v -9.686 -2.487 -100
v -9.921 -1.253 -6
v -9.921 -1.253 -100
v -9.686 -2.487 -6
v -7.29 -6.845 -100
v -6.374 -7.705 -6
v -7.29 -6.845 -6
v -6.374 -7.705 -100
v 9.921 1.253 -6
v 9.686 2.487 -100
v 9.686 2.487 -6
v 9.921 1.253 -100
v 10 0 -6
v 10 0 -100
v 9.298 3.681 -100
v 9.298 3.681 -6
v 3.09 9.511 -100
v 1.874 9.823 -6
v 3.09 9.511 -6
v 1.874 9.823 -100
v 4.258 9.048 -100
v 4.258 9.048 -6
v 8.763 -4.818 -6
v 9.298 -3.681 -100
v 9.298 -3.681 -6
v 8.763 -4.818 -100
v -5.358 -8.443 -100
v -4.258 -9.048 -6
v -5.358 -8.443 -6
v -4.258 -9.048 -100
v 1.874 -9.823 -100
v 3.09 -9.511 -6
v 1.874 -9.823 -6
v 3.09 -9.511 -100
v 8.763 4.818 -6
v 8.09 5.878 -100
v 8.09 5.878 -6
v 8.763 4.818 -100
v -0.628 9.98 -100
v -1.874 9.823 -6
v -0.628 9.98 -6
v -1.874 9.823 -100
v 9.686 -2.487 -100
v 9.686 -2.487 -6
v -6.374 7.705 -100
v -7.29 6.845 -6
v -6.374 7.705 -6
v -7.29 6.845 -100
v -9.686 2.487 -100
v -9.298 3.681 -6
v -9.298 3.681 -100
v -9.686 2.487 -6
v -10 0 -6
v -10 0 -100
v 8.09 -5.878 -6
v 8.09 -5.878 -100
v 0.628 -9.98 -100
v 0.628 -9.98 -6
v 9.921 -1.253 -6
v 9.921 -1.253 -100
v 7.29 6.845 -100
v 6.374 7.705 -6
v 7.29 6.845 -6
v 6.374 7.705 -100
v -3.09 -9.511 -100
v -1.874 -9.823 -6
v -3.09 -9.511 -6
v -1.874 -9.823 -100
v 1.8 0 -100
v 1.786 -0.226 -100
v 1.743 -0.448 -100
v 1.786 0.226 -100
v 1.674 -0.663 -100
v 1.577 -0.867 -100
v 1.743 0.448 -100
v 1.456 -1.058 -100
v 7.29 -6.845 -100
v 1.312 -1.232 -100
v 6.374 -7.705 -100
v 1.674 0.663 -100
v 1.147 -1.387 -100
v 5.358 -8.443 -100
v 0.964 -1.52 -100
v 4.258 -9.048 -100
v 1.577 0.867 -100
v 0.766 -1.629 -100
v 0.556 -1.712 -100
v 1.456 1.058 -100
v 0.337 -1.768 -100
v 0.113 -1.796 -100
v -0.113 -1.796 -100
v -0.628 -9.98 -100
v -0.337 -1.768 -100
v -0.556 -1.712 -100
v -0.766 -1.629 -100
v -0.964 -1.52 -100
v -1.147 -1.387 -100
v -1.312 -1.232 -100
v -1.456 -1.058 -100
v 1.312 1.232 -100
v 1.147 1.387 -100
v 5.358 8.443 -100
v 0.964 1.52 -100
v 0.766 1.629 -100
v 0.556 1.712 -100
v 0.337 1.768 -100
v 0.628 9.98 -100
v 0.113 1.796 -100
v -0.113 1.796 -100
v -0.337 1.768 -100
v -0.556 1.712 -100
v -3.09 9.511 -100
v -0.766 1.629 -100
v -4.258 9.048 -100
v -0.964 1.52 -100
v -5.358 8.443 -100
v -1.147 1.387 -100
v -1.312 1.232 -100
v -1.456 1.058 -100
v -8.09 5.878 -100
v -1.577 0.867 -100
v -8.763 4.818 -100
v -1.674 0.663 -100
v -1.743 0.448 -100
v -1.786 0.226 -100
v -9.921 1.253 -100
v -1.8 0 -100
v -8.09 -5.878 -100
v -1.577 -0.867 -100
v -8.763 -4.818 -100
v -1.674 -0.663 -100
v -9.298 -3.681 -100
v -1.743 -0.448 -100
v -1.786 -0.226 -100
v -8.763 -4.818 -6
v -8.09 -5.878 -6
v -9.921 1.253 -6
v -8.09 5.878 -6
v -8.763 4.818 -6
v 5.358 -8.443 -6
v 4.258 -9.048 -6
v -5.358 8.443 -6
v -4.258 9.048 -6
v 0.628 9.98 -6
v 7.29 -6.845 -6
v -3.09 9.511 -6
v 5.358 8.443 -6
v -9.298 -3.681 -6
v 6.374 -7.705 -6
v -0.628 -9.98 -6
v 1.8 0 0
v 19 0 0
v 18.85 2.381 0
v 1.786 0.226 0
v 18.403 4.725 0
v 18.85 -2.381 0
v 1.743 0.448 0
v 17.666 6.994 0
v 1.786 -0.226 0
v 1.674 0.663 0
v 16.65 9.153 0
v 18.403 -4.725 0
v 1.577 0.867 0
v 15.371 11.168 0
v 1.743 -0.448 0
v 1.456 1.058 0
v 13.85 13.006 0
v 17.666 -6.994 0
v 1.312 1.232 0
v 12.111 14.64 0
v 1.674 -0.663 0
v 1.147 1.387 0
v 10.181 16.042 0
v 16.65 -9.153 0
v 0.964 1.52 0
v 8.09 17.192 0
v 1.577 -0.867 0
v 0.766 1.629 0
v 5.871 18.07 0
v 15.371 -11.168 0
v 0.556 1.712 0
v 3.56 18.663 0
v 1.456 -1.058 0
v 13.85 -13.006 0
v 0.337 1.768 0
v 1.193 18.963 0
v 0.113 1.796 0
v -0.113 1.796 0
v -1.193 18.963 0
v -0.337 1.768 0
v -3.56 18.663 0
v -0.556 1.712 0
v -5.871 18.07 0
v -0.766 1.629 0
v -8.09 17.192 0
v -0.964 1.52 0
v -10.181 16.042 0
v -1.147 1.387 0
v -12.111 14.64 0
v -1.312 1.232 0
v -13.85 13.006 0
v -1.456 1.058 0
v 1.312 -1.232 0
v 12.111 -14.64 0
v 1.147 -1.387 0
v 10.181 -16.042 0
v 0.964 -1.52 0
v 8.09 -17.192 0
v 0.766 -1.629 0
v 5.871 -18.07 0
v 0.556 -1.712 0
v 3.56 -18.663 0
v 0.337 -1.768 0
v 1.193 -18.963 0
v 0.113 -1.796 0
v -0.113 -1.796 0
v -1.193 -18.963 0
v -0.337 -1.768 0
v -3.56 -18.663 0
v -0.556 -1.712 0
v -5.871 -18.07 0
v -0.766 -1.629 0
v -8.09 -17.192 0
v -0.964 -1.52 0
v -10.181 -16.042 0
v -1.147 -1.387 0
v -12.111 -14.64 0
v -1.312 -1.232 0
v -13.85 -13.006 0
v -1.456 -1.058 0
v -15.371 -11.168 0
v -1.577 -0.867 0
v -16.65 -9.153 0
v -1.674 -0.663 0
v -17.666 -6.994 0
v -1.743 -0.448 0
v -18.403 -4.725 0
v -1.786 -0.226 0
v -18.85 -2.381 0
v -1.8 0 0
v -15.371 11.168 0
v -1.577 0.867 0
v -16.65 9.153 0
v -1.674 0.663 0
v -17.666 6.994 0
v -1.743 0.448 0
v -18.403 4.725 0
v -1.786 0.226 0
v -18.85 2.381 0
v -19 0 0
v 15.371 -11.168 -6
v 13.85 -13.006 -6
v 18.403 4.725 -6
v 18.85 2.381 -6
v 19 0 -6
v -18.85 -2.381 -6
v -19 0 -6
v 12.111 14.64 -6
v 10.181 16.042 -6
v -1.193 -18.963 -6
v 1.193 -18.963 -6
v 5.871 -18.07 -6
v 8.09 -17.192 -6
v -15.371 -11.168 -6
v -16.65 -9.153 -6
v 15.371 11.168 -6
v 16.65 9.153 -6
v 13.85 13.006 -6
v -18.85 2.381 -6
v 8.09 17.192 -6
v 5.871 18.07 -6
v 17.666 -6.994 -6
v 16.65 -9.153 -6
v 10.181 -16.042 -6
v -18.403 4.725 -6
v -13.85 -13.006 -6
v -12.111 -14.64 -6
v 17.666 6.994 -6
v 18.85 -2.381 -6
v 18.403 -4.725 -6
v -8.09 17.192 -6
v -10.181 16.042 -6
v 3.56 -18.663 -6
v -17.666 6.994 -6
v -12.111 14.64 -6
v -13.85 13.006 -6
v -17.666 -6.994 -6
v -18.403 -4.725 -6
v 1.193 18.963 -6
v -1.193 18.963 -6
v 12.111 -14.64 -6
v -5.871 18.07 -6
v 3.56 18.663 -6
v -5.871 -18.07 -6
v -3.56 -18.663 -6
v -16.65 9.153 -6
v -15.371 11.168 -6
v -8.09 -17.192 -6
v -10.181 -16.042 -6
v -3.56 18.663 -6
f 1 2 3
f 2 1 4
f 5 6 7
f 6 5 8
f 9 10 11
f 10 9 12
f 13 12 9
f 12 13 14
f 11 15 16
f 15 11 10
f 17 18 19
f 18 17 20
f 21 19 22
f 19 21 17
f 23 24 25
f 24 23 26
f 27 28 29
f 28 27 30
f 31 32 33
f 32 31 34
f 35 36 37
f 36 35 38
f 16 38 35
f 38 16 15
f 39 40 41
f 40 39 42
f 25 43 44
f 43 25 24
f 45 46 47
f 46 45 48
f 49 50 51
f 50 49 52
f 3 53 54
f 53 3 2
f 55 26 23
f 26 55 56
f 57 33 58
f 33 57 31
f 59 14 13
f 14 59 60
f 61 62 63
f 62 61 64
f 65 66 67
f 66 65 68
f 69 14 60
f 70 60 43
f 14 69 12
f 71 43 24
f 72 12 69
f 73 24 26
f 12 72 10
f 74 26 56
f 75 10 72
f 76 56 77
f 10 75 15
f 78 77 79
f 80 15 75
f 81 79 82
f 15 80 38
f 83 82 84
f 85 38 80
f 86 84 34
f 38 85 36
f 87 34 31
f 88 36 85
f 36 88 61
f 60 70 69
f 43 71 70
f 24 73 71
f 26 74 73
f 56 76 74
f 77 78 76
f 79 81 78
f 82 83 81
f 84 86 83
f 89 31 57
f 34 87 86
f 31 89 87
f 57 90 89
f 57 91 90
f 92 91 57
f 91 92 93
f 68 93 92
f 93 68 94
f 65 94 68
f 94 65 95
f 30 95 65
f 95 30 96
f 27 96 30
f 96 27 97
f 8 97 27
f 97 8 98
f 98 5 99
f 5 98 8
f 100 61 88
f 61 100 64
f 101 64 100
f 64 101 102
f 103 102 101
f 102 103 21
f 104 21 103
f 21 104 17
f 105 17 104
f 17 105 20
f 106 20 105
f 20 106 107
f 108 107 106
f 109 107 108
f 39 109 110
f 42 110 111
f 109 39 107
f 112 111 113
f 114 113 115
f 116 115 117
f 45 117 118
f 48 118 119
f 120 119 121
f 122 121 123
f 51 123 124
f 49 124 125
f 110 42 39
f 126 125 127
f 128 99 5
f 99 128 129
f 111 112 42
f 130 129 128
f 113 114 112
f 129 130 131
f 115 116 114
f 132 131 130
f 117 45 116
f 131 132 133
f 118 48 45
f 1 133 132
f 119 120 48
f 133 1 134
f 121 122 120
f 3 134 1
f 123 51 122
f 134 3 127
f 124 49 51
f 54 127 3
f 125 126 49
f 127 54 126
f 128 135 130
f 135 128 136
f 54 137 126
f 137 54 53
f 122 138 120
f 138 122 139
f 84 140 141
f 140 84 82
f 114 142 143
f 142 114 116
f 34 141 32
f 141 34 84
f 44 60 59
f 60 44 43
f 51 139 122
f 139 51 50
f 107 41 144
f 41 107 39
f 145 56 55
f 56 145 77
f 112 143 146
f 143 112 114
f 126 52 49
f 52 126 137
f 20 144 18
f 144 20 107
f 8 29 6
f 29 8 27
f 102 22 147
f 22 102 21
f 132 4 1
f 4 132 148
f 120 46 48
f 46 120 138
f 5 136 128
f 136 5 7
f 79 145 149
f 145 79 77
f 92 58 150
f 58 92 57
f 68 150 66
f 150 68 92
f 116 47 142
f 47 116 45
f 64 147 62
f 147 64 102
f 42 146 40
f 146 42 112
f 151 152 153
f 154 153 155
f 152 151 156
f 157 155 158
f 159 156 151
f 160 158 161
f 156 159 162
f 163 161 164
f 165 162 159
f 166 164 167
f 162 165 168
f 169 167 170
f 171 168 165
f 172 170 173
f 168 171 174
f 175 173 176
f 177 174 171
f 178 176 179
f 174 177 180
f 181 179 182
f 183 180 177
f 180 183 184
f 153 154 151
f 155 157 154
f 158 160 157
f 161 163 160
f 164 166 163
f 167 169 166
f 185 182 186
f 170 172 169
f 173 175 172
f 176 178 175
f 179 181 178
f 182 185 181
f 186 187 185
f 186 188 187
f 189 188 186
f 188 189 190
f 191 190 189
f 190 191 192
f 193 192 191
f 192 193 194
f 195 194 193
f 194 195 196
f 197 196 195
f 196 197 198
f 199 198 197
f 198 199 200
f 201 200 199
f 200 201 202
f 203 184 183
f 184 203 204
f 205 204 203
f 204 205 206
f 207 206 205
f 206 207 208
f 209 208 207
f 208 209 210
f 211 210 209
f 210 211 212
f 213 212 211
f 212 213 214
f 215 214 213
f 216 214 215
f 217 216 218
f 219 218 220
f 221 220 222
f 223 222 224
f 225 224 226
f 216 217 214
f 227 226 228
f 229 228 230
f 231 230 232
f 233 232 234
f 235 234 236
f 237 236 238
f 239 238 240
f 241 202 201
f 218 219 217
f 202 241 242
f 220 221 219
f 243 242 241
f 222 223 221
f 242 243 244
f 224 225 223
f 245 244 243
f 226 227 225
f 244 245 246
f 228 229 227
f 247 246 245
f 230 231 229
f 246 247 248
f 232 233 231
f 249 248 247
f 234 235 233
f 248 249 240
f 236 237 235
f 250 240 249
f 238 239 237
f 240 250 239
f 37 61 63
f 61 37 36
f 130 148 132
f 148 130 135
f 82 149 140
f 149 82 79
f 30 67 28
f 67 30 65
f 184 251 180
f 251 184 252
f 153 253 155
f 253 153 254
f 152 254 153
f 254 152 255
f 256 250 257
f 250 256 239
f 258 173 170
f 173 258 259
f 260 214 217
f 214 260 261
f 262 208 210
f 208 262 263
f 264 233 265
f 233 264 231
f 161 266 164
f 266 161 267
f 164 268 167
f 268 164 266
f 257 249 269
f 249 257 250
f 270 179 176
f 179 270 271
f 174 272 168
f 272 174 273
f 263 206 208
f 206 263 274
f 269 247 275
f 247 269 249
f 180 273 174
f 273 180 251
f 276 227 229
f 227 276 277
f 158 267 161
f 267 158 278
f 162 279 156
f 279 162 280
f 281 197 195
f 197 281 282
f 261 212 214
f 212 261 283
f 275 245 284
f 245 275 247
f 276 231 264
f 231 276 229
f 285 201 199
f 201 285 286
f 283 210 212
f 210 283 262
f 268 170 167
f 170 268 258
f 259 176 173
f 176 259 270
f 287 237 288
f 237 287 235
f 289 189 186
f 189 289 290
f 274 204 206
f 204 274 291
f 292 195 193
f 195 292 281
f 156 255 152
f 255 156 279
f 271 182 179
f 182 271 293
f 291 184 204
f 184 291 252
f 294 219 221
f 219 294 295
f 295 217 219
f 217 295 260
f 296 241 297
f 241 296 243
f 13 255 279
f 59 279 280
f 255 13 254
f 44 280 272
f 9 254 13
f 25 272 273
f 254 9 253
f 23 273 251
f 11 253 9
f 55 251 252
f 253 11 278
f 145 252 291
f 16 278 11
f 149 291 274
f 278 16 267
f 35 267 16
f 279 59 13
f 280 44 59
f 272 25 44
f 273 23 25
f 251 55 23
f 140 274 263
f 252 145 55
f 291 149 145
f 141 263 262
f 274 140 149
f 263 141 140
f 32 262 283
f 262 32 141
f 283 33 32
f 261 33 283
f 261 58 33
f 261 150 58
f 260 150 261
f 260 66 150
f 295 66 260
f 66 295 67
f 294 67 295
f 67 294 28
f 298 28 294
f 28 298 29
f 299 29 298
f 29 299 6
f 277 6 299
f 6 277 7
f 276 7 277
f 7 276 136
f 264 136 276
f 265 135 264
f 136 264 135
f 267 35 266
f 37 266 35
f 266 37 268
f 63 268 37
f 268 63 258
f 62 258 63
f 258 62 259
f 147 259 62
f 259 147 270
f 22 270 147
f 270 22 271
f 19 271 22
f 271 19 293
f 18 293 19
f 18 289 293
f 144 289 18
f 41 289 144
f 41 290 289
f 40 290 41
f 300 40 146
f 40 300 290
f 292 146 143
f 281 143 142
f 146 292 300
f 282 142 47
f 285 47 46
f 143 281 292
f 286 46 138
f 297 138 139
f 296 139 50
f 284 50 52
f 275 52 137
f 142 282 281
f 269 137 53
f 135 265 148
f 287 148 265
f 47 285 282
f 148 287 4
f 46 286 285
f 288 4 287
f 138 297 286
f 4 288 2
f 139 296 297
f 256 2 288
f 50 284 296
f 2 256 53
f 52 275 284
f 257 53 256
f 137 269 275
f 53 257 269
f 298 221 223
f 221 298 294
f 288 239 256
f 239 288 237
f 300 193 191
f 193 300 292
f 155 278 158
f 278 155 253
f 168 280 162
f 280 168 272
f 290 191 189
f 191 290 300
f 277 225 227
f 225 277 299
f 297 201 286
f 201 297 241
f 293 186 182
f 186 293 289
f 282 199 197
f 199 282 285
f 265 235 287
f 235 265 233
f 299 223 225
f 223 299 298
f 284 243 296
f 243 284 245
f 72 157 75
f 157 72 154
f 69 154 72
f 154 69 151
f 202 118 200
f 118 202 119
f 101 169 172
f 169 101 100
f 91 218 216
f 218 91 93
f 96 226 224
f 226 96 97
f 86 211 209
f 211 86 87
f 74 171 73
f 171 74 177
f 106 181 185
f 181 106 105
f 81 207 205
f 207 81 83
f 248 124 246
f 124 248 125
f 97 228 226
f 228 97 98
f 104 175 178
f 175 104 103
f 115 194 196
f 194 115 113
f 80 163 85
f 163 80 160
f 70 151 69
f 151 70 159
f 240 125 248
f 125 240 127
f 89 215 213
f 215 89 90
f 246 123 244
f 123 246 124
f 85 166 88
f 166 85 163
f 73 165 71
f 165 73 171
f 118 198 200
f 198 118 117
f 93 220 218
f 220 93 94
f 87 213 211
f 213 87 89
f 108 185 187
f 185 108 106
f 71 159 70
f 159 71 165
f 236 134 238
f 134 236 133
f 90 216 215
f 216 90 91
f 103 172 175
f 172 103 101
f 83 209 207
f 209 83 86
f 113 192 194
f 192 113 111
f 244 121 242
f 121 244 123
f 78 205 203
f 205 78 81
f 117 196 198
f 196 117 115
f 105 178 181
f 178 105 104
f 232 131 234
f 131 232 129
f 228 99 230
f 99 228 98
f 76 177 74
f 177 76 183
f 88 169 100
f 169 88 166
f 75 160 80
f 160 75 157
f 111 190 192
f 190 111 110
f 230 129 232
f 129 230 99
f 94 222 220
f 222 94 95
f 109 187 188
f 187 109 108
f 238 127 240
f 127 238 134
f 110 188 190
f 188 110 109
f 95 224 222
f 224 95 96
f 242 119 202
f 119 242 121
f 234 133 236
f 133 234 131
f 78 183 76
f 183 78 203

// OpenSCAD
$fn = 50;


difference() {
	union() {
		translate(v = [0, 0, -100.0000000000]) {
			cylinder(h = 100, r = 10.0000000000);
		}
		translate(v = [0, 0, -6.0000000000]) {
			cylinder(h = 6, r = 19.0000000000);
		}
	}
	union() {
		#translate(v = [0, 0, -100]) {
			cylinder(h = 100, r = 1.8000000000);
		}
	}
}
